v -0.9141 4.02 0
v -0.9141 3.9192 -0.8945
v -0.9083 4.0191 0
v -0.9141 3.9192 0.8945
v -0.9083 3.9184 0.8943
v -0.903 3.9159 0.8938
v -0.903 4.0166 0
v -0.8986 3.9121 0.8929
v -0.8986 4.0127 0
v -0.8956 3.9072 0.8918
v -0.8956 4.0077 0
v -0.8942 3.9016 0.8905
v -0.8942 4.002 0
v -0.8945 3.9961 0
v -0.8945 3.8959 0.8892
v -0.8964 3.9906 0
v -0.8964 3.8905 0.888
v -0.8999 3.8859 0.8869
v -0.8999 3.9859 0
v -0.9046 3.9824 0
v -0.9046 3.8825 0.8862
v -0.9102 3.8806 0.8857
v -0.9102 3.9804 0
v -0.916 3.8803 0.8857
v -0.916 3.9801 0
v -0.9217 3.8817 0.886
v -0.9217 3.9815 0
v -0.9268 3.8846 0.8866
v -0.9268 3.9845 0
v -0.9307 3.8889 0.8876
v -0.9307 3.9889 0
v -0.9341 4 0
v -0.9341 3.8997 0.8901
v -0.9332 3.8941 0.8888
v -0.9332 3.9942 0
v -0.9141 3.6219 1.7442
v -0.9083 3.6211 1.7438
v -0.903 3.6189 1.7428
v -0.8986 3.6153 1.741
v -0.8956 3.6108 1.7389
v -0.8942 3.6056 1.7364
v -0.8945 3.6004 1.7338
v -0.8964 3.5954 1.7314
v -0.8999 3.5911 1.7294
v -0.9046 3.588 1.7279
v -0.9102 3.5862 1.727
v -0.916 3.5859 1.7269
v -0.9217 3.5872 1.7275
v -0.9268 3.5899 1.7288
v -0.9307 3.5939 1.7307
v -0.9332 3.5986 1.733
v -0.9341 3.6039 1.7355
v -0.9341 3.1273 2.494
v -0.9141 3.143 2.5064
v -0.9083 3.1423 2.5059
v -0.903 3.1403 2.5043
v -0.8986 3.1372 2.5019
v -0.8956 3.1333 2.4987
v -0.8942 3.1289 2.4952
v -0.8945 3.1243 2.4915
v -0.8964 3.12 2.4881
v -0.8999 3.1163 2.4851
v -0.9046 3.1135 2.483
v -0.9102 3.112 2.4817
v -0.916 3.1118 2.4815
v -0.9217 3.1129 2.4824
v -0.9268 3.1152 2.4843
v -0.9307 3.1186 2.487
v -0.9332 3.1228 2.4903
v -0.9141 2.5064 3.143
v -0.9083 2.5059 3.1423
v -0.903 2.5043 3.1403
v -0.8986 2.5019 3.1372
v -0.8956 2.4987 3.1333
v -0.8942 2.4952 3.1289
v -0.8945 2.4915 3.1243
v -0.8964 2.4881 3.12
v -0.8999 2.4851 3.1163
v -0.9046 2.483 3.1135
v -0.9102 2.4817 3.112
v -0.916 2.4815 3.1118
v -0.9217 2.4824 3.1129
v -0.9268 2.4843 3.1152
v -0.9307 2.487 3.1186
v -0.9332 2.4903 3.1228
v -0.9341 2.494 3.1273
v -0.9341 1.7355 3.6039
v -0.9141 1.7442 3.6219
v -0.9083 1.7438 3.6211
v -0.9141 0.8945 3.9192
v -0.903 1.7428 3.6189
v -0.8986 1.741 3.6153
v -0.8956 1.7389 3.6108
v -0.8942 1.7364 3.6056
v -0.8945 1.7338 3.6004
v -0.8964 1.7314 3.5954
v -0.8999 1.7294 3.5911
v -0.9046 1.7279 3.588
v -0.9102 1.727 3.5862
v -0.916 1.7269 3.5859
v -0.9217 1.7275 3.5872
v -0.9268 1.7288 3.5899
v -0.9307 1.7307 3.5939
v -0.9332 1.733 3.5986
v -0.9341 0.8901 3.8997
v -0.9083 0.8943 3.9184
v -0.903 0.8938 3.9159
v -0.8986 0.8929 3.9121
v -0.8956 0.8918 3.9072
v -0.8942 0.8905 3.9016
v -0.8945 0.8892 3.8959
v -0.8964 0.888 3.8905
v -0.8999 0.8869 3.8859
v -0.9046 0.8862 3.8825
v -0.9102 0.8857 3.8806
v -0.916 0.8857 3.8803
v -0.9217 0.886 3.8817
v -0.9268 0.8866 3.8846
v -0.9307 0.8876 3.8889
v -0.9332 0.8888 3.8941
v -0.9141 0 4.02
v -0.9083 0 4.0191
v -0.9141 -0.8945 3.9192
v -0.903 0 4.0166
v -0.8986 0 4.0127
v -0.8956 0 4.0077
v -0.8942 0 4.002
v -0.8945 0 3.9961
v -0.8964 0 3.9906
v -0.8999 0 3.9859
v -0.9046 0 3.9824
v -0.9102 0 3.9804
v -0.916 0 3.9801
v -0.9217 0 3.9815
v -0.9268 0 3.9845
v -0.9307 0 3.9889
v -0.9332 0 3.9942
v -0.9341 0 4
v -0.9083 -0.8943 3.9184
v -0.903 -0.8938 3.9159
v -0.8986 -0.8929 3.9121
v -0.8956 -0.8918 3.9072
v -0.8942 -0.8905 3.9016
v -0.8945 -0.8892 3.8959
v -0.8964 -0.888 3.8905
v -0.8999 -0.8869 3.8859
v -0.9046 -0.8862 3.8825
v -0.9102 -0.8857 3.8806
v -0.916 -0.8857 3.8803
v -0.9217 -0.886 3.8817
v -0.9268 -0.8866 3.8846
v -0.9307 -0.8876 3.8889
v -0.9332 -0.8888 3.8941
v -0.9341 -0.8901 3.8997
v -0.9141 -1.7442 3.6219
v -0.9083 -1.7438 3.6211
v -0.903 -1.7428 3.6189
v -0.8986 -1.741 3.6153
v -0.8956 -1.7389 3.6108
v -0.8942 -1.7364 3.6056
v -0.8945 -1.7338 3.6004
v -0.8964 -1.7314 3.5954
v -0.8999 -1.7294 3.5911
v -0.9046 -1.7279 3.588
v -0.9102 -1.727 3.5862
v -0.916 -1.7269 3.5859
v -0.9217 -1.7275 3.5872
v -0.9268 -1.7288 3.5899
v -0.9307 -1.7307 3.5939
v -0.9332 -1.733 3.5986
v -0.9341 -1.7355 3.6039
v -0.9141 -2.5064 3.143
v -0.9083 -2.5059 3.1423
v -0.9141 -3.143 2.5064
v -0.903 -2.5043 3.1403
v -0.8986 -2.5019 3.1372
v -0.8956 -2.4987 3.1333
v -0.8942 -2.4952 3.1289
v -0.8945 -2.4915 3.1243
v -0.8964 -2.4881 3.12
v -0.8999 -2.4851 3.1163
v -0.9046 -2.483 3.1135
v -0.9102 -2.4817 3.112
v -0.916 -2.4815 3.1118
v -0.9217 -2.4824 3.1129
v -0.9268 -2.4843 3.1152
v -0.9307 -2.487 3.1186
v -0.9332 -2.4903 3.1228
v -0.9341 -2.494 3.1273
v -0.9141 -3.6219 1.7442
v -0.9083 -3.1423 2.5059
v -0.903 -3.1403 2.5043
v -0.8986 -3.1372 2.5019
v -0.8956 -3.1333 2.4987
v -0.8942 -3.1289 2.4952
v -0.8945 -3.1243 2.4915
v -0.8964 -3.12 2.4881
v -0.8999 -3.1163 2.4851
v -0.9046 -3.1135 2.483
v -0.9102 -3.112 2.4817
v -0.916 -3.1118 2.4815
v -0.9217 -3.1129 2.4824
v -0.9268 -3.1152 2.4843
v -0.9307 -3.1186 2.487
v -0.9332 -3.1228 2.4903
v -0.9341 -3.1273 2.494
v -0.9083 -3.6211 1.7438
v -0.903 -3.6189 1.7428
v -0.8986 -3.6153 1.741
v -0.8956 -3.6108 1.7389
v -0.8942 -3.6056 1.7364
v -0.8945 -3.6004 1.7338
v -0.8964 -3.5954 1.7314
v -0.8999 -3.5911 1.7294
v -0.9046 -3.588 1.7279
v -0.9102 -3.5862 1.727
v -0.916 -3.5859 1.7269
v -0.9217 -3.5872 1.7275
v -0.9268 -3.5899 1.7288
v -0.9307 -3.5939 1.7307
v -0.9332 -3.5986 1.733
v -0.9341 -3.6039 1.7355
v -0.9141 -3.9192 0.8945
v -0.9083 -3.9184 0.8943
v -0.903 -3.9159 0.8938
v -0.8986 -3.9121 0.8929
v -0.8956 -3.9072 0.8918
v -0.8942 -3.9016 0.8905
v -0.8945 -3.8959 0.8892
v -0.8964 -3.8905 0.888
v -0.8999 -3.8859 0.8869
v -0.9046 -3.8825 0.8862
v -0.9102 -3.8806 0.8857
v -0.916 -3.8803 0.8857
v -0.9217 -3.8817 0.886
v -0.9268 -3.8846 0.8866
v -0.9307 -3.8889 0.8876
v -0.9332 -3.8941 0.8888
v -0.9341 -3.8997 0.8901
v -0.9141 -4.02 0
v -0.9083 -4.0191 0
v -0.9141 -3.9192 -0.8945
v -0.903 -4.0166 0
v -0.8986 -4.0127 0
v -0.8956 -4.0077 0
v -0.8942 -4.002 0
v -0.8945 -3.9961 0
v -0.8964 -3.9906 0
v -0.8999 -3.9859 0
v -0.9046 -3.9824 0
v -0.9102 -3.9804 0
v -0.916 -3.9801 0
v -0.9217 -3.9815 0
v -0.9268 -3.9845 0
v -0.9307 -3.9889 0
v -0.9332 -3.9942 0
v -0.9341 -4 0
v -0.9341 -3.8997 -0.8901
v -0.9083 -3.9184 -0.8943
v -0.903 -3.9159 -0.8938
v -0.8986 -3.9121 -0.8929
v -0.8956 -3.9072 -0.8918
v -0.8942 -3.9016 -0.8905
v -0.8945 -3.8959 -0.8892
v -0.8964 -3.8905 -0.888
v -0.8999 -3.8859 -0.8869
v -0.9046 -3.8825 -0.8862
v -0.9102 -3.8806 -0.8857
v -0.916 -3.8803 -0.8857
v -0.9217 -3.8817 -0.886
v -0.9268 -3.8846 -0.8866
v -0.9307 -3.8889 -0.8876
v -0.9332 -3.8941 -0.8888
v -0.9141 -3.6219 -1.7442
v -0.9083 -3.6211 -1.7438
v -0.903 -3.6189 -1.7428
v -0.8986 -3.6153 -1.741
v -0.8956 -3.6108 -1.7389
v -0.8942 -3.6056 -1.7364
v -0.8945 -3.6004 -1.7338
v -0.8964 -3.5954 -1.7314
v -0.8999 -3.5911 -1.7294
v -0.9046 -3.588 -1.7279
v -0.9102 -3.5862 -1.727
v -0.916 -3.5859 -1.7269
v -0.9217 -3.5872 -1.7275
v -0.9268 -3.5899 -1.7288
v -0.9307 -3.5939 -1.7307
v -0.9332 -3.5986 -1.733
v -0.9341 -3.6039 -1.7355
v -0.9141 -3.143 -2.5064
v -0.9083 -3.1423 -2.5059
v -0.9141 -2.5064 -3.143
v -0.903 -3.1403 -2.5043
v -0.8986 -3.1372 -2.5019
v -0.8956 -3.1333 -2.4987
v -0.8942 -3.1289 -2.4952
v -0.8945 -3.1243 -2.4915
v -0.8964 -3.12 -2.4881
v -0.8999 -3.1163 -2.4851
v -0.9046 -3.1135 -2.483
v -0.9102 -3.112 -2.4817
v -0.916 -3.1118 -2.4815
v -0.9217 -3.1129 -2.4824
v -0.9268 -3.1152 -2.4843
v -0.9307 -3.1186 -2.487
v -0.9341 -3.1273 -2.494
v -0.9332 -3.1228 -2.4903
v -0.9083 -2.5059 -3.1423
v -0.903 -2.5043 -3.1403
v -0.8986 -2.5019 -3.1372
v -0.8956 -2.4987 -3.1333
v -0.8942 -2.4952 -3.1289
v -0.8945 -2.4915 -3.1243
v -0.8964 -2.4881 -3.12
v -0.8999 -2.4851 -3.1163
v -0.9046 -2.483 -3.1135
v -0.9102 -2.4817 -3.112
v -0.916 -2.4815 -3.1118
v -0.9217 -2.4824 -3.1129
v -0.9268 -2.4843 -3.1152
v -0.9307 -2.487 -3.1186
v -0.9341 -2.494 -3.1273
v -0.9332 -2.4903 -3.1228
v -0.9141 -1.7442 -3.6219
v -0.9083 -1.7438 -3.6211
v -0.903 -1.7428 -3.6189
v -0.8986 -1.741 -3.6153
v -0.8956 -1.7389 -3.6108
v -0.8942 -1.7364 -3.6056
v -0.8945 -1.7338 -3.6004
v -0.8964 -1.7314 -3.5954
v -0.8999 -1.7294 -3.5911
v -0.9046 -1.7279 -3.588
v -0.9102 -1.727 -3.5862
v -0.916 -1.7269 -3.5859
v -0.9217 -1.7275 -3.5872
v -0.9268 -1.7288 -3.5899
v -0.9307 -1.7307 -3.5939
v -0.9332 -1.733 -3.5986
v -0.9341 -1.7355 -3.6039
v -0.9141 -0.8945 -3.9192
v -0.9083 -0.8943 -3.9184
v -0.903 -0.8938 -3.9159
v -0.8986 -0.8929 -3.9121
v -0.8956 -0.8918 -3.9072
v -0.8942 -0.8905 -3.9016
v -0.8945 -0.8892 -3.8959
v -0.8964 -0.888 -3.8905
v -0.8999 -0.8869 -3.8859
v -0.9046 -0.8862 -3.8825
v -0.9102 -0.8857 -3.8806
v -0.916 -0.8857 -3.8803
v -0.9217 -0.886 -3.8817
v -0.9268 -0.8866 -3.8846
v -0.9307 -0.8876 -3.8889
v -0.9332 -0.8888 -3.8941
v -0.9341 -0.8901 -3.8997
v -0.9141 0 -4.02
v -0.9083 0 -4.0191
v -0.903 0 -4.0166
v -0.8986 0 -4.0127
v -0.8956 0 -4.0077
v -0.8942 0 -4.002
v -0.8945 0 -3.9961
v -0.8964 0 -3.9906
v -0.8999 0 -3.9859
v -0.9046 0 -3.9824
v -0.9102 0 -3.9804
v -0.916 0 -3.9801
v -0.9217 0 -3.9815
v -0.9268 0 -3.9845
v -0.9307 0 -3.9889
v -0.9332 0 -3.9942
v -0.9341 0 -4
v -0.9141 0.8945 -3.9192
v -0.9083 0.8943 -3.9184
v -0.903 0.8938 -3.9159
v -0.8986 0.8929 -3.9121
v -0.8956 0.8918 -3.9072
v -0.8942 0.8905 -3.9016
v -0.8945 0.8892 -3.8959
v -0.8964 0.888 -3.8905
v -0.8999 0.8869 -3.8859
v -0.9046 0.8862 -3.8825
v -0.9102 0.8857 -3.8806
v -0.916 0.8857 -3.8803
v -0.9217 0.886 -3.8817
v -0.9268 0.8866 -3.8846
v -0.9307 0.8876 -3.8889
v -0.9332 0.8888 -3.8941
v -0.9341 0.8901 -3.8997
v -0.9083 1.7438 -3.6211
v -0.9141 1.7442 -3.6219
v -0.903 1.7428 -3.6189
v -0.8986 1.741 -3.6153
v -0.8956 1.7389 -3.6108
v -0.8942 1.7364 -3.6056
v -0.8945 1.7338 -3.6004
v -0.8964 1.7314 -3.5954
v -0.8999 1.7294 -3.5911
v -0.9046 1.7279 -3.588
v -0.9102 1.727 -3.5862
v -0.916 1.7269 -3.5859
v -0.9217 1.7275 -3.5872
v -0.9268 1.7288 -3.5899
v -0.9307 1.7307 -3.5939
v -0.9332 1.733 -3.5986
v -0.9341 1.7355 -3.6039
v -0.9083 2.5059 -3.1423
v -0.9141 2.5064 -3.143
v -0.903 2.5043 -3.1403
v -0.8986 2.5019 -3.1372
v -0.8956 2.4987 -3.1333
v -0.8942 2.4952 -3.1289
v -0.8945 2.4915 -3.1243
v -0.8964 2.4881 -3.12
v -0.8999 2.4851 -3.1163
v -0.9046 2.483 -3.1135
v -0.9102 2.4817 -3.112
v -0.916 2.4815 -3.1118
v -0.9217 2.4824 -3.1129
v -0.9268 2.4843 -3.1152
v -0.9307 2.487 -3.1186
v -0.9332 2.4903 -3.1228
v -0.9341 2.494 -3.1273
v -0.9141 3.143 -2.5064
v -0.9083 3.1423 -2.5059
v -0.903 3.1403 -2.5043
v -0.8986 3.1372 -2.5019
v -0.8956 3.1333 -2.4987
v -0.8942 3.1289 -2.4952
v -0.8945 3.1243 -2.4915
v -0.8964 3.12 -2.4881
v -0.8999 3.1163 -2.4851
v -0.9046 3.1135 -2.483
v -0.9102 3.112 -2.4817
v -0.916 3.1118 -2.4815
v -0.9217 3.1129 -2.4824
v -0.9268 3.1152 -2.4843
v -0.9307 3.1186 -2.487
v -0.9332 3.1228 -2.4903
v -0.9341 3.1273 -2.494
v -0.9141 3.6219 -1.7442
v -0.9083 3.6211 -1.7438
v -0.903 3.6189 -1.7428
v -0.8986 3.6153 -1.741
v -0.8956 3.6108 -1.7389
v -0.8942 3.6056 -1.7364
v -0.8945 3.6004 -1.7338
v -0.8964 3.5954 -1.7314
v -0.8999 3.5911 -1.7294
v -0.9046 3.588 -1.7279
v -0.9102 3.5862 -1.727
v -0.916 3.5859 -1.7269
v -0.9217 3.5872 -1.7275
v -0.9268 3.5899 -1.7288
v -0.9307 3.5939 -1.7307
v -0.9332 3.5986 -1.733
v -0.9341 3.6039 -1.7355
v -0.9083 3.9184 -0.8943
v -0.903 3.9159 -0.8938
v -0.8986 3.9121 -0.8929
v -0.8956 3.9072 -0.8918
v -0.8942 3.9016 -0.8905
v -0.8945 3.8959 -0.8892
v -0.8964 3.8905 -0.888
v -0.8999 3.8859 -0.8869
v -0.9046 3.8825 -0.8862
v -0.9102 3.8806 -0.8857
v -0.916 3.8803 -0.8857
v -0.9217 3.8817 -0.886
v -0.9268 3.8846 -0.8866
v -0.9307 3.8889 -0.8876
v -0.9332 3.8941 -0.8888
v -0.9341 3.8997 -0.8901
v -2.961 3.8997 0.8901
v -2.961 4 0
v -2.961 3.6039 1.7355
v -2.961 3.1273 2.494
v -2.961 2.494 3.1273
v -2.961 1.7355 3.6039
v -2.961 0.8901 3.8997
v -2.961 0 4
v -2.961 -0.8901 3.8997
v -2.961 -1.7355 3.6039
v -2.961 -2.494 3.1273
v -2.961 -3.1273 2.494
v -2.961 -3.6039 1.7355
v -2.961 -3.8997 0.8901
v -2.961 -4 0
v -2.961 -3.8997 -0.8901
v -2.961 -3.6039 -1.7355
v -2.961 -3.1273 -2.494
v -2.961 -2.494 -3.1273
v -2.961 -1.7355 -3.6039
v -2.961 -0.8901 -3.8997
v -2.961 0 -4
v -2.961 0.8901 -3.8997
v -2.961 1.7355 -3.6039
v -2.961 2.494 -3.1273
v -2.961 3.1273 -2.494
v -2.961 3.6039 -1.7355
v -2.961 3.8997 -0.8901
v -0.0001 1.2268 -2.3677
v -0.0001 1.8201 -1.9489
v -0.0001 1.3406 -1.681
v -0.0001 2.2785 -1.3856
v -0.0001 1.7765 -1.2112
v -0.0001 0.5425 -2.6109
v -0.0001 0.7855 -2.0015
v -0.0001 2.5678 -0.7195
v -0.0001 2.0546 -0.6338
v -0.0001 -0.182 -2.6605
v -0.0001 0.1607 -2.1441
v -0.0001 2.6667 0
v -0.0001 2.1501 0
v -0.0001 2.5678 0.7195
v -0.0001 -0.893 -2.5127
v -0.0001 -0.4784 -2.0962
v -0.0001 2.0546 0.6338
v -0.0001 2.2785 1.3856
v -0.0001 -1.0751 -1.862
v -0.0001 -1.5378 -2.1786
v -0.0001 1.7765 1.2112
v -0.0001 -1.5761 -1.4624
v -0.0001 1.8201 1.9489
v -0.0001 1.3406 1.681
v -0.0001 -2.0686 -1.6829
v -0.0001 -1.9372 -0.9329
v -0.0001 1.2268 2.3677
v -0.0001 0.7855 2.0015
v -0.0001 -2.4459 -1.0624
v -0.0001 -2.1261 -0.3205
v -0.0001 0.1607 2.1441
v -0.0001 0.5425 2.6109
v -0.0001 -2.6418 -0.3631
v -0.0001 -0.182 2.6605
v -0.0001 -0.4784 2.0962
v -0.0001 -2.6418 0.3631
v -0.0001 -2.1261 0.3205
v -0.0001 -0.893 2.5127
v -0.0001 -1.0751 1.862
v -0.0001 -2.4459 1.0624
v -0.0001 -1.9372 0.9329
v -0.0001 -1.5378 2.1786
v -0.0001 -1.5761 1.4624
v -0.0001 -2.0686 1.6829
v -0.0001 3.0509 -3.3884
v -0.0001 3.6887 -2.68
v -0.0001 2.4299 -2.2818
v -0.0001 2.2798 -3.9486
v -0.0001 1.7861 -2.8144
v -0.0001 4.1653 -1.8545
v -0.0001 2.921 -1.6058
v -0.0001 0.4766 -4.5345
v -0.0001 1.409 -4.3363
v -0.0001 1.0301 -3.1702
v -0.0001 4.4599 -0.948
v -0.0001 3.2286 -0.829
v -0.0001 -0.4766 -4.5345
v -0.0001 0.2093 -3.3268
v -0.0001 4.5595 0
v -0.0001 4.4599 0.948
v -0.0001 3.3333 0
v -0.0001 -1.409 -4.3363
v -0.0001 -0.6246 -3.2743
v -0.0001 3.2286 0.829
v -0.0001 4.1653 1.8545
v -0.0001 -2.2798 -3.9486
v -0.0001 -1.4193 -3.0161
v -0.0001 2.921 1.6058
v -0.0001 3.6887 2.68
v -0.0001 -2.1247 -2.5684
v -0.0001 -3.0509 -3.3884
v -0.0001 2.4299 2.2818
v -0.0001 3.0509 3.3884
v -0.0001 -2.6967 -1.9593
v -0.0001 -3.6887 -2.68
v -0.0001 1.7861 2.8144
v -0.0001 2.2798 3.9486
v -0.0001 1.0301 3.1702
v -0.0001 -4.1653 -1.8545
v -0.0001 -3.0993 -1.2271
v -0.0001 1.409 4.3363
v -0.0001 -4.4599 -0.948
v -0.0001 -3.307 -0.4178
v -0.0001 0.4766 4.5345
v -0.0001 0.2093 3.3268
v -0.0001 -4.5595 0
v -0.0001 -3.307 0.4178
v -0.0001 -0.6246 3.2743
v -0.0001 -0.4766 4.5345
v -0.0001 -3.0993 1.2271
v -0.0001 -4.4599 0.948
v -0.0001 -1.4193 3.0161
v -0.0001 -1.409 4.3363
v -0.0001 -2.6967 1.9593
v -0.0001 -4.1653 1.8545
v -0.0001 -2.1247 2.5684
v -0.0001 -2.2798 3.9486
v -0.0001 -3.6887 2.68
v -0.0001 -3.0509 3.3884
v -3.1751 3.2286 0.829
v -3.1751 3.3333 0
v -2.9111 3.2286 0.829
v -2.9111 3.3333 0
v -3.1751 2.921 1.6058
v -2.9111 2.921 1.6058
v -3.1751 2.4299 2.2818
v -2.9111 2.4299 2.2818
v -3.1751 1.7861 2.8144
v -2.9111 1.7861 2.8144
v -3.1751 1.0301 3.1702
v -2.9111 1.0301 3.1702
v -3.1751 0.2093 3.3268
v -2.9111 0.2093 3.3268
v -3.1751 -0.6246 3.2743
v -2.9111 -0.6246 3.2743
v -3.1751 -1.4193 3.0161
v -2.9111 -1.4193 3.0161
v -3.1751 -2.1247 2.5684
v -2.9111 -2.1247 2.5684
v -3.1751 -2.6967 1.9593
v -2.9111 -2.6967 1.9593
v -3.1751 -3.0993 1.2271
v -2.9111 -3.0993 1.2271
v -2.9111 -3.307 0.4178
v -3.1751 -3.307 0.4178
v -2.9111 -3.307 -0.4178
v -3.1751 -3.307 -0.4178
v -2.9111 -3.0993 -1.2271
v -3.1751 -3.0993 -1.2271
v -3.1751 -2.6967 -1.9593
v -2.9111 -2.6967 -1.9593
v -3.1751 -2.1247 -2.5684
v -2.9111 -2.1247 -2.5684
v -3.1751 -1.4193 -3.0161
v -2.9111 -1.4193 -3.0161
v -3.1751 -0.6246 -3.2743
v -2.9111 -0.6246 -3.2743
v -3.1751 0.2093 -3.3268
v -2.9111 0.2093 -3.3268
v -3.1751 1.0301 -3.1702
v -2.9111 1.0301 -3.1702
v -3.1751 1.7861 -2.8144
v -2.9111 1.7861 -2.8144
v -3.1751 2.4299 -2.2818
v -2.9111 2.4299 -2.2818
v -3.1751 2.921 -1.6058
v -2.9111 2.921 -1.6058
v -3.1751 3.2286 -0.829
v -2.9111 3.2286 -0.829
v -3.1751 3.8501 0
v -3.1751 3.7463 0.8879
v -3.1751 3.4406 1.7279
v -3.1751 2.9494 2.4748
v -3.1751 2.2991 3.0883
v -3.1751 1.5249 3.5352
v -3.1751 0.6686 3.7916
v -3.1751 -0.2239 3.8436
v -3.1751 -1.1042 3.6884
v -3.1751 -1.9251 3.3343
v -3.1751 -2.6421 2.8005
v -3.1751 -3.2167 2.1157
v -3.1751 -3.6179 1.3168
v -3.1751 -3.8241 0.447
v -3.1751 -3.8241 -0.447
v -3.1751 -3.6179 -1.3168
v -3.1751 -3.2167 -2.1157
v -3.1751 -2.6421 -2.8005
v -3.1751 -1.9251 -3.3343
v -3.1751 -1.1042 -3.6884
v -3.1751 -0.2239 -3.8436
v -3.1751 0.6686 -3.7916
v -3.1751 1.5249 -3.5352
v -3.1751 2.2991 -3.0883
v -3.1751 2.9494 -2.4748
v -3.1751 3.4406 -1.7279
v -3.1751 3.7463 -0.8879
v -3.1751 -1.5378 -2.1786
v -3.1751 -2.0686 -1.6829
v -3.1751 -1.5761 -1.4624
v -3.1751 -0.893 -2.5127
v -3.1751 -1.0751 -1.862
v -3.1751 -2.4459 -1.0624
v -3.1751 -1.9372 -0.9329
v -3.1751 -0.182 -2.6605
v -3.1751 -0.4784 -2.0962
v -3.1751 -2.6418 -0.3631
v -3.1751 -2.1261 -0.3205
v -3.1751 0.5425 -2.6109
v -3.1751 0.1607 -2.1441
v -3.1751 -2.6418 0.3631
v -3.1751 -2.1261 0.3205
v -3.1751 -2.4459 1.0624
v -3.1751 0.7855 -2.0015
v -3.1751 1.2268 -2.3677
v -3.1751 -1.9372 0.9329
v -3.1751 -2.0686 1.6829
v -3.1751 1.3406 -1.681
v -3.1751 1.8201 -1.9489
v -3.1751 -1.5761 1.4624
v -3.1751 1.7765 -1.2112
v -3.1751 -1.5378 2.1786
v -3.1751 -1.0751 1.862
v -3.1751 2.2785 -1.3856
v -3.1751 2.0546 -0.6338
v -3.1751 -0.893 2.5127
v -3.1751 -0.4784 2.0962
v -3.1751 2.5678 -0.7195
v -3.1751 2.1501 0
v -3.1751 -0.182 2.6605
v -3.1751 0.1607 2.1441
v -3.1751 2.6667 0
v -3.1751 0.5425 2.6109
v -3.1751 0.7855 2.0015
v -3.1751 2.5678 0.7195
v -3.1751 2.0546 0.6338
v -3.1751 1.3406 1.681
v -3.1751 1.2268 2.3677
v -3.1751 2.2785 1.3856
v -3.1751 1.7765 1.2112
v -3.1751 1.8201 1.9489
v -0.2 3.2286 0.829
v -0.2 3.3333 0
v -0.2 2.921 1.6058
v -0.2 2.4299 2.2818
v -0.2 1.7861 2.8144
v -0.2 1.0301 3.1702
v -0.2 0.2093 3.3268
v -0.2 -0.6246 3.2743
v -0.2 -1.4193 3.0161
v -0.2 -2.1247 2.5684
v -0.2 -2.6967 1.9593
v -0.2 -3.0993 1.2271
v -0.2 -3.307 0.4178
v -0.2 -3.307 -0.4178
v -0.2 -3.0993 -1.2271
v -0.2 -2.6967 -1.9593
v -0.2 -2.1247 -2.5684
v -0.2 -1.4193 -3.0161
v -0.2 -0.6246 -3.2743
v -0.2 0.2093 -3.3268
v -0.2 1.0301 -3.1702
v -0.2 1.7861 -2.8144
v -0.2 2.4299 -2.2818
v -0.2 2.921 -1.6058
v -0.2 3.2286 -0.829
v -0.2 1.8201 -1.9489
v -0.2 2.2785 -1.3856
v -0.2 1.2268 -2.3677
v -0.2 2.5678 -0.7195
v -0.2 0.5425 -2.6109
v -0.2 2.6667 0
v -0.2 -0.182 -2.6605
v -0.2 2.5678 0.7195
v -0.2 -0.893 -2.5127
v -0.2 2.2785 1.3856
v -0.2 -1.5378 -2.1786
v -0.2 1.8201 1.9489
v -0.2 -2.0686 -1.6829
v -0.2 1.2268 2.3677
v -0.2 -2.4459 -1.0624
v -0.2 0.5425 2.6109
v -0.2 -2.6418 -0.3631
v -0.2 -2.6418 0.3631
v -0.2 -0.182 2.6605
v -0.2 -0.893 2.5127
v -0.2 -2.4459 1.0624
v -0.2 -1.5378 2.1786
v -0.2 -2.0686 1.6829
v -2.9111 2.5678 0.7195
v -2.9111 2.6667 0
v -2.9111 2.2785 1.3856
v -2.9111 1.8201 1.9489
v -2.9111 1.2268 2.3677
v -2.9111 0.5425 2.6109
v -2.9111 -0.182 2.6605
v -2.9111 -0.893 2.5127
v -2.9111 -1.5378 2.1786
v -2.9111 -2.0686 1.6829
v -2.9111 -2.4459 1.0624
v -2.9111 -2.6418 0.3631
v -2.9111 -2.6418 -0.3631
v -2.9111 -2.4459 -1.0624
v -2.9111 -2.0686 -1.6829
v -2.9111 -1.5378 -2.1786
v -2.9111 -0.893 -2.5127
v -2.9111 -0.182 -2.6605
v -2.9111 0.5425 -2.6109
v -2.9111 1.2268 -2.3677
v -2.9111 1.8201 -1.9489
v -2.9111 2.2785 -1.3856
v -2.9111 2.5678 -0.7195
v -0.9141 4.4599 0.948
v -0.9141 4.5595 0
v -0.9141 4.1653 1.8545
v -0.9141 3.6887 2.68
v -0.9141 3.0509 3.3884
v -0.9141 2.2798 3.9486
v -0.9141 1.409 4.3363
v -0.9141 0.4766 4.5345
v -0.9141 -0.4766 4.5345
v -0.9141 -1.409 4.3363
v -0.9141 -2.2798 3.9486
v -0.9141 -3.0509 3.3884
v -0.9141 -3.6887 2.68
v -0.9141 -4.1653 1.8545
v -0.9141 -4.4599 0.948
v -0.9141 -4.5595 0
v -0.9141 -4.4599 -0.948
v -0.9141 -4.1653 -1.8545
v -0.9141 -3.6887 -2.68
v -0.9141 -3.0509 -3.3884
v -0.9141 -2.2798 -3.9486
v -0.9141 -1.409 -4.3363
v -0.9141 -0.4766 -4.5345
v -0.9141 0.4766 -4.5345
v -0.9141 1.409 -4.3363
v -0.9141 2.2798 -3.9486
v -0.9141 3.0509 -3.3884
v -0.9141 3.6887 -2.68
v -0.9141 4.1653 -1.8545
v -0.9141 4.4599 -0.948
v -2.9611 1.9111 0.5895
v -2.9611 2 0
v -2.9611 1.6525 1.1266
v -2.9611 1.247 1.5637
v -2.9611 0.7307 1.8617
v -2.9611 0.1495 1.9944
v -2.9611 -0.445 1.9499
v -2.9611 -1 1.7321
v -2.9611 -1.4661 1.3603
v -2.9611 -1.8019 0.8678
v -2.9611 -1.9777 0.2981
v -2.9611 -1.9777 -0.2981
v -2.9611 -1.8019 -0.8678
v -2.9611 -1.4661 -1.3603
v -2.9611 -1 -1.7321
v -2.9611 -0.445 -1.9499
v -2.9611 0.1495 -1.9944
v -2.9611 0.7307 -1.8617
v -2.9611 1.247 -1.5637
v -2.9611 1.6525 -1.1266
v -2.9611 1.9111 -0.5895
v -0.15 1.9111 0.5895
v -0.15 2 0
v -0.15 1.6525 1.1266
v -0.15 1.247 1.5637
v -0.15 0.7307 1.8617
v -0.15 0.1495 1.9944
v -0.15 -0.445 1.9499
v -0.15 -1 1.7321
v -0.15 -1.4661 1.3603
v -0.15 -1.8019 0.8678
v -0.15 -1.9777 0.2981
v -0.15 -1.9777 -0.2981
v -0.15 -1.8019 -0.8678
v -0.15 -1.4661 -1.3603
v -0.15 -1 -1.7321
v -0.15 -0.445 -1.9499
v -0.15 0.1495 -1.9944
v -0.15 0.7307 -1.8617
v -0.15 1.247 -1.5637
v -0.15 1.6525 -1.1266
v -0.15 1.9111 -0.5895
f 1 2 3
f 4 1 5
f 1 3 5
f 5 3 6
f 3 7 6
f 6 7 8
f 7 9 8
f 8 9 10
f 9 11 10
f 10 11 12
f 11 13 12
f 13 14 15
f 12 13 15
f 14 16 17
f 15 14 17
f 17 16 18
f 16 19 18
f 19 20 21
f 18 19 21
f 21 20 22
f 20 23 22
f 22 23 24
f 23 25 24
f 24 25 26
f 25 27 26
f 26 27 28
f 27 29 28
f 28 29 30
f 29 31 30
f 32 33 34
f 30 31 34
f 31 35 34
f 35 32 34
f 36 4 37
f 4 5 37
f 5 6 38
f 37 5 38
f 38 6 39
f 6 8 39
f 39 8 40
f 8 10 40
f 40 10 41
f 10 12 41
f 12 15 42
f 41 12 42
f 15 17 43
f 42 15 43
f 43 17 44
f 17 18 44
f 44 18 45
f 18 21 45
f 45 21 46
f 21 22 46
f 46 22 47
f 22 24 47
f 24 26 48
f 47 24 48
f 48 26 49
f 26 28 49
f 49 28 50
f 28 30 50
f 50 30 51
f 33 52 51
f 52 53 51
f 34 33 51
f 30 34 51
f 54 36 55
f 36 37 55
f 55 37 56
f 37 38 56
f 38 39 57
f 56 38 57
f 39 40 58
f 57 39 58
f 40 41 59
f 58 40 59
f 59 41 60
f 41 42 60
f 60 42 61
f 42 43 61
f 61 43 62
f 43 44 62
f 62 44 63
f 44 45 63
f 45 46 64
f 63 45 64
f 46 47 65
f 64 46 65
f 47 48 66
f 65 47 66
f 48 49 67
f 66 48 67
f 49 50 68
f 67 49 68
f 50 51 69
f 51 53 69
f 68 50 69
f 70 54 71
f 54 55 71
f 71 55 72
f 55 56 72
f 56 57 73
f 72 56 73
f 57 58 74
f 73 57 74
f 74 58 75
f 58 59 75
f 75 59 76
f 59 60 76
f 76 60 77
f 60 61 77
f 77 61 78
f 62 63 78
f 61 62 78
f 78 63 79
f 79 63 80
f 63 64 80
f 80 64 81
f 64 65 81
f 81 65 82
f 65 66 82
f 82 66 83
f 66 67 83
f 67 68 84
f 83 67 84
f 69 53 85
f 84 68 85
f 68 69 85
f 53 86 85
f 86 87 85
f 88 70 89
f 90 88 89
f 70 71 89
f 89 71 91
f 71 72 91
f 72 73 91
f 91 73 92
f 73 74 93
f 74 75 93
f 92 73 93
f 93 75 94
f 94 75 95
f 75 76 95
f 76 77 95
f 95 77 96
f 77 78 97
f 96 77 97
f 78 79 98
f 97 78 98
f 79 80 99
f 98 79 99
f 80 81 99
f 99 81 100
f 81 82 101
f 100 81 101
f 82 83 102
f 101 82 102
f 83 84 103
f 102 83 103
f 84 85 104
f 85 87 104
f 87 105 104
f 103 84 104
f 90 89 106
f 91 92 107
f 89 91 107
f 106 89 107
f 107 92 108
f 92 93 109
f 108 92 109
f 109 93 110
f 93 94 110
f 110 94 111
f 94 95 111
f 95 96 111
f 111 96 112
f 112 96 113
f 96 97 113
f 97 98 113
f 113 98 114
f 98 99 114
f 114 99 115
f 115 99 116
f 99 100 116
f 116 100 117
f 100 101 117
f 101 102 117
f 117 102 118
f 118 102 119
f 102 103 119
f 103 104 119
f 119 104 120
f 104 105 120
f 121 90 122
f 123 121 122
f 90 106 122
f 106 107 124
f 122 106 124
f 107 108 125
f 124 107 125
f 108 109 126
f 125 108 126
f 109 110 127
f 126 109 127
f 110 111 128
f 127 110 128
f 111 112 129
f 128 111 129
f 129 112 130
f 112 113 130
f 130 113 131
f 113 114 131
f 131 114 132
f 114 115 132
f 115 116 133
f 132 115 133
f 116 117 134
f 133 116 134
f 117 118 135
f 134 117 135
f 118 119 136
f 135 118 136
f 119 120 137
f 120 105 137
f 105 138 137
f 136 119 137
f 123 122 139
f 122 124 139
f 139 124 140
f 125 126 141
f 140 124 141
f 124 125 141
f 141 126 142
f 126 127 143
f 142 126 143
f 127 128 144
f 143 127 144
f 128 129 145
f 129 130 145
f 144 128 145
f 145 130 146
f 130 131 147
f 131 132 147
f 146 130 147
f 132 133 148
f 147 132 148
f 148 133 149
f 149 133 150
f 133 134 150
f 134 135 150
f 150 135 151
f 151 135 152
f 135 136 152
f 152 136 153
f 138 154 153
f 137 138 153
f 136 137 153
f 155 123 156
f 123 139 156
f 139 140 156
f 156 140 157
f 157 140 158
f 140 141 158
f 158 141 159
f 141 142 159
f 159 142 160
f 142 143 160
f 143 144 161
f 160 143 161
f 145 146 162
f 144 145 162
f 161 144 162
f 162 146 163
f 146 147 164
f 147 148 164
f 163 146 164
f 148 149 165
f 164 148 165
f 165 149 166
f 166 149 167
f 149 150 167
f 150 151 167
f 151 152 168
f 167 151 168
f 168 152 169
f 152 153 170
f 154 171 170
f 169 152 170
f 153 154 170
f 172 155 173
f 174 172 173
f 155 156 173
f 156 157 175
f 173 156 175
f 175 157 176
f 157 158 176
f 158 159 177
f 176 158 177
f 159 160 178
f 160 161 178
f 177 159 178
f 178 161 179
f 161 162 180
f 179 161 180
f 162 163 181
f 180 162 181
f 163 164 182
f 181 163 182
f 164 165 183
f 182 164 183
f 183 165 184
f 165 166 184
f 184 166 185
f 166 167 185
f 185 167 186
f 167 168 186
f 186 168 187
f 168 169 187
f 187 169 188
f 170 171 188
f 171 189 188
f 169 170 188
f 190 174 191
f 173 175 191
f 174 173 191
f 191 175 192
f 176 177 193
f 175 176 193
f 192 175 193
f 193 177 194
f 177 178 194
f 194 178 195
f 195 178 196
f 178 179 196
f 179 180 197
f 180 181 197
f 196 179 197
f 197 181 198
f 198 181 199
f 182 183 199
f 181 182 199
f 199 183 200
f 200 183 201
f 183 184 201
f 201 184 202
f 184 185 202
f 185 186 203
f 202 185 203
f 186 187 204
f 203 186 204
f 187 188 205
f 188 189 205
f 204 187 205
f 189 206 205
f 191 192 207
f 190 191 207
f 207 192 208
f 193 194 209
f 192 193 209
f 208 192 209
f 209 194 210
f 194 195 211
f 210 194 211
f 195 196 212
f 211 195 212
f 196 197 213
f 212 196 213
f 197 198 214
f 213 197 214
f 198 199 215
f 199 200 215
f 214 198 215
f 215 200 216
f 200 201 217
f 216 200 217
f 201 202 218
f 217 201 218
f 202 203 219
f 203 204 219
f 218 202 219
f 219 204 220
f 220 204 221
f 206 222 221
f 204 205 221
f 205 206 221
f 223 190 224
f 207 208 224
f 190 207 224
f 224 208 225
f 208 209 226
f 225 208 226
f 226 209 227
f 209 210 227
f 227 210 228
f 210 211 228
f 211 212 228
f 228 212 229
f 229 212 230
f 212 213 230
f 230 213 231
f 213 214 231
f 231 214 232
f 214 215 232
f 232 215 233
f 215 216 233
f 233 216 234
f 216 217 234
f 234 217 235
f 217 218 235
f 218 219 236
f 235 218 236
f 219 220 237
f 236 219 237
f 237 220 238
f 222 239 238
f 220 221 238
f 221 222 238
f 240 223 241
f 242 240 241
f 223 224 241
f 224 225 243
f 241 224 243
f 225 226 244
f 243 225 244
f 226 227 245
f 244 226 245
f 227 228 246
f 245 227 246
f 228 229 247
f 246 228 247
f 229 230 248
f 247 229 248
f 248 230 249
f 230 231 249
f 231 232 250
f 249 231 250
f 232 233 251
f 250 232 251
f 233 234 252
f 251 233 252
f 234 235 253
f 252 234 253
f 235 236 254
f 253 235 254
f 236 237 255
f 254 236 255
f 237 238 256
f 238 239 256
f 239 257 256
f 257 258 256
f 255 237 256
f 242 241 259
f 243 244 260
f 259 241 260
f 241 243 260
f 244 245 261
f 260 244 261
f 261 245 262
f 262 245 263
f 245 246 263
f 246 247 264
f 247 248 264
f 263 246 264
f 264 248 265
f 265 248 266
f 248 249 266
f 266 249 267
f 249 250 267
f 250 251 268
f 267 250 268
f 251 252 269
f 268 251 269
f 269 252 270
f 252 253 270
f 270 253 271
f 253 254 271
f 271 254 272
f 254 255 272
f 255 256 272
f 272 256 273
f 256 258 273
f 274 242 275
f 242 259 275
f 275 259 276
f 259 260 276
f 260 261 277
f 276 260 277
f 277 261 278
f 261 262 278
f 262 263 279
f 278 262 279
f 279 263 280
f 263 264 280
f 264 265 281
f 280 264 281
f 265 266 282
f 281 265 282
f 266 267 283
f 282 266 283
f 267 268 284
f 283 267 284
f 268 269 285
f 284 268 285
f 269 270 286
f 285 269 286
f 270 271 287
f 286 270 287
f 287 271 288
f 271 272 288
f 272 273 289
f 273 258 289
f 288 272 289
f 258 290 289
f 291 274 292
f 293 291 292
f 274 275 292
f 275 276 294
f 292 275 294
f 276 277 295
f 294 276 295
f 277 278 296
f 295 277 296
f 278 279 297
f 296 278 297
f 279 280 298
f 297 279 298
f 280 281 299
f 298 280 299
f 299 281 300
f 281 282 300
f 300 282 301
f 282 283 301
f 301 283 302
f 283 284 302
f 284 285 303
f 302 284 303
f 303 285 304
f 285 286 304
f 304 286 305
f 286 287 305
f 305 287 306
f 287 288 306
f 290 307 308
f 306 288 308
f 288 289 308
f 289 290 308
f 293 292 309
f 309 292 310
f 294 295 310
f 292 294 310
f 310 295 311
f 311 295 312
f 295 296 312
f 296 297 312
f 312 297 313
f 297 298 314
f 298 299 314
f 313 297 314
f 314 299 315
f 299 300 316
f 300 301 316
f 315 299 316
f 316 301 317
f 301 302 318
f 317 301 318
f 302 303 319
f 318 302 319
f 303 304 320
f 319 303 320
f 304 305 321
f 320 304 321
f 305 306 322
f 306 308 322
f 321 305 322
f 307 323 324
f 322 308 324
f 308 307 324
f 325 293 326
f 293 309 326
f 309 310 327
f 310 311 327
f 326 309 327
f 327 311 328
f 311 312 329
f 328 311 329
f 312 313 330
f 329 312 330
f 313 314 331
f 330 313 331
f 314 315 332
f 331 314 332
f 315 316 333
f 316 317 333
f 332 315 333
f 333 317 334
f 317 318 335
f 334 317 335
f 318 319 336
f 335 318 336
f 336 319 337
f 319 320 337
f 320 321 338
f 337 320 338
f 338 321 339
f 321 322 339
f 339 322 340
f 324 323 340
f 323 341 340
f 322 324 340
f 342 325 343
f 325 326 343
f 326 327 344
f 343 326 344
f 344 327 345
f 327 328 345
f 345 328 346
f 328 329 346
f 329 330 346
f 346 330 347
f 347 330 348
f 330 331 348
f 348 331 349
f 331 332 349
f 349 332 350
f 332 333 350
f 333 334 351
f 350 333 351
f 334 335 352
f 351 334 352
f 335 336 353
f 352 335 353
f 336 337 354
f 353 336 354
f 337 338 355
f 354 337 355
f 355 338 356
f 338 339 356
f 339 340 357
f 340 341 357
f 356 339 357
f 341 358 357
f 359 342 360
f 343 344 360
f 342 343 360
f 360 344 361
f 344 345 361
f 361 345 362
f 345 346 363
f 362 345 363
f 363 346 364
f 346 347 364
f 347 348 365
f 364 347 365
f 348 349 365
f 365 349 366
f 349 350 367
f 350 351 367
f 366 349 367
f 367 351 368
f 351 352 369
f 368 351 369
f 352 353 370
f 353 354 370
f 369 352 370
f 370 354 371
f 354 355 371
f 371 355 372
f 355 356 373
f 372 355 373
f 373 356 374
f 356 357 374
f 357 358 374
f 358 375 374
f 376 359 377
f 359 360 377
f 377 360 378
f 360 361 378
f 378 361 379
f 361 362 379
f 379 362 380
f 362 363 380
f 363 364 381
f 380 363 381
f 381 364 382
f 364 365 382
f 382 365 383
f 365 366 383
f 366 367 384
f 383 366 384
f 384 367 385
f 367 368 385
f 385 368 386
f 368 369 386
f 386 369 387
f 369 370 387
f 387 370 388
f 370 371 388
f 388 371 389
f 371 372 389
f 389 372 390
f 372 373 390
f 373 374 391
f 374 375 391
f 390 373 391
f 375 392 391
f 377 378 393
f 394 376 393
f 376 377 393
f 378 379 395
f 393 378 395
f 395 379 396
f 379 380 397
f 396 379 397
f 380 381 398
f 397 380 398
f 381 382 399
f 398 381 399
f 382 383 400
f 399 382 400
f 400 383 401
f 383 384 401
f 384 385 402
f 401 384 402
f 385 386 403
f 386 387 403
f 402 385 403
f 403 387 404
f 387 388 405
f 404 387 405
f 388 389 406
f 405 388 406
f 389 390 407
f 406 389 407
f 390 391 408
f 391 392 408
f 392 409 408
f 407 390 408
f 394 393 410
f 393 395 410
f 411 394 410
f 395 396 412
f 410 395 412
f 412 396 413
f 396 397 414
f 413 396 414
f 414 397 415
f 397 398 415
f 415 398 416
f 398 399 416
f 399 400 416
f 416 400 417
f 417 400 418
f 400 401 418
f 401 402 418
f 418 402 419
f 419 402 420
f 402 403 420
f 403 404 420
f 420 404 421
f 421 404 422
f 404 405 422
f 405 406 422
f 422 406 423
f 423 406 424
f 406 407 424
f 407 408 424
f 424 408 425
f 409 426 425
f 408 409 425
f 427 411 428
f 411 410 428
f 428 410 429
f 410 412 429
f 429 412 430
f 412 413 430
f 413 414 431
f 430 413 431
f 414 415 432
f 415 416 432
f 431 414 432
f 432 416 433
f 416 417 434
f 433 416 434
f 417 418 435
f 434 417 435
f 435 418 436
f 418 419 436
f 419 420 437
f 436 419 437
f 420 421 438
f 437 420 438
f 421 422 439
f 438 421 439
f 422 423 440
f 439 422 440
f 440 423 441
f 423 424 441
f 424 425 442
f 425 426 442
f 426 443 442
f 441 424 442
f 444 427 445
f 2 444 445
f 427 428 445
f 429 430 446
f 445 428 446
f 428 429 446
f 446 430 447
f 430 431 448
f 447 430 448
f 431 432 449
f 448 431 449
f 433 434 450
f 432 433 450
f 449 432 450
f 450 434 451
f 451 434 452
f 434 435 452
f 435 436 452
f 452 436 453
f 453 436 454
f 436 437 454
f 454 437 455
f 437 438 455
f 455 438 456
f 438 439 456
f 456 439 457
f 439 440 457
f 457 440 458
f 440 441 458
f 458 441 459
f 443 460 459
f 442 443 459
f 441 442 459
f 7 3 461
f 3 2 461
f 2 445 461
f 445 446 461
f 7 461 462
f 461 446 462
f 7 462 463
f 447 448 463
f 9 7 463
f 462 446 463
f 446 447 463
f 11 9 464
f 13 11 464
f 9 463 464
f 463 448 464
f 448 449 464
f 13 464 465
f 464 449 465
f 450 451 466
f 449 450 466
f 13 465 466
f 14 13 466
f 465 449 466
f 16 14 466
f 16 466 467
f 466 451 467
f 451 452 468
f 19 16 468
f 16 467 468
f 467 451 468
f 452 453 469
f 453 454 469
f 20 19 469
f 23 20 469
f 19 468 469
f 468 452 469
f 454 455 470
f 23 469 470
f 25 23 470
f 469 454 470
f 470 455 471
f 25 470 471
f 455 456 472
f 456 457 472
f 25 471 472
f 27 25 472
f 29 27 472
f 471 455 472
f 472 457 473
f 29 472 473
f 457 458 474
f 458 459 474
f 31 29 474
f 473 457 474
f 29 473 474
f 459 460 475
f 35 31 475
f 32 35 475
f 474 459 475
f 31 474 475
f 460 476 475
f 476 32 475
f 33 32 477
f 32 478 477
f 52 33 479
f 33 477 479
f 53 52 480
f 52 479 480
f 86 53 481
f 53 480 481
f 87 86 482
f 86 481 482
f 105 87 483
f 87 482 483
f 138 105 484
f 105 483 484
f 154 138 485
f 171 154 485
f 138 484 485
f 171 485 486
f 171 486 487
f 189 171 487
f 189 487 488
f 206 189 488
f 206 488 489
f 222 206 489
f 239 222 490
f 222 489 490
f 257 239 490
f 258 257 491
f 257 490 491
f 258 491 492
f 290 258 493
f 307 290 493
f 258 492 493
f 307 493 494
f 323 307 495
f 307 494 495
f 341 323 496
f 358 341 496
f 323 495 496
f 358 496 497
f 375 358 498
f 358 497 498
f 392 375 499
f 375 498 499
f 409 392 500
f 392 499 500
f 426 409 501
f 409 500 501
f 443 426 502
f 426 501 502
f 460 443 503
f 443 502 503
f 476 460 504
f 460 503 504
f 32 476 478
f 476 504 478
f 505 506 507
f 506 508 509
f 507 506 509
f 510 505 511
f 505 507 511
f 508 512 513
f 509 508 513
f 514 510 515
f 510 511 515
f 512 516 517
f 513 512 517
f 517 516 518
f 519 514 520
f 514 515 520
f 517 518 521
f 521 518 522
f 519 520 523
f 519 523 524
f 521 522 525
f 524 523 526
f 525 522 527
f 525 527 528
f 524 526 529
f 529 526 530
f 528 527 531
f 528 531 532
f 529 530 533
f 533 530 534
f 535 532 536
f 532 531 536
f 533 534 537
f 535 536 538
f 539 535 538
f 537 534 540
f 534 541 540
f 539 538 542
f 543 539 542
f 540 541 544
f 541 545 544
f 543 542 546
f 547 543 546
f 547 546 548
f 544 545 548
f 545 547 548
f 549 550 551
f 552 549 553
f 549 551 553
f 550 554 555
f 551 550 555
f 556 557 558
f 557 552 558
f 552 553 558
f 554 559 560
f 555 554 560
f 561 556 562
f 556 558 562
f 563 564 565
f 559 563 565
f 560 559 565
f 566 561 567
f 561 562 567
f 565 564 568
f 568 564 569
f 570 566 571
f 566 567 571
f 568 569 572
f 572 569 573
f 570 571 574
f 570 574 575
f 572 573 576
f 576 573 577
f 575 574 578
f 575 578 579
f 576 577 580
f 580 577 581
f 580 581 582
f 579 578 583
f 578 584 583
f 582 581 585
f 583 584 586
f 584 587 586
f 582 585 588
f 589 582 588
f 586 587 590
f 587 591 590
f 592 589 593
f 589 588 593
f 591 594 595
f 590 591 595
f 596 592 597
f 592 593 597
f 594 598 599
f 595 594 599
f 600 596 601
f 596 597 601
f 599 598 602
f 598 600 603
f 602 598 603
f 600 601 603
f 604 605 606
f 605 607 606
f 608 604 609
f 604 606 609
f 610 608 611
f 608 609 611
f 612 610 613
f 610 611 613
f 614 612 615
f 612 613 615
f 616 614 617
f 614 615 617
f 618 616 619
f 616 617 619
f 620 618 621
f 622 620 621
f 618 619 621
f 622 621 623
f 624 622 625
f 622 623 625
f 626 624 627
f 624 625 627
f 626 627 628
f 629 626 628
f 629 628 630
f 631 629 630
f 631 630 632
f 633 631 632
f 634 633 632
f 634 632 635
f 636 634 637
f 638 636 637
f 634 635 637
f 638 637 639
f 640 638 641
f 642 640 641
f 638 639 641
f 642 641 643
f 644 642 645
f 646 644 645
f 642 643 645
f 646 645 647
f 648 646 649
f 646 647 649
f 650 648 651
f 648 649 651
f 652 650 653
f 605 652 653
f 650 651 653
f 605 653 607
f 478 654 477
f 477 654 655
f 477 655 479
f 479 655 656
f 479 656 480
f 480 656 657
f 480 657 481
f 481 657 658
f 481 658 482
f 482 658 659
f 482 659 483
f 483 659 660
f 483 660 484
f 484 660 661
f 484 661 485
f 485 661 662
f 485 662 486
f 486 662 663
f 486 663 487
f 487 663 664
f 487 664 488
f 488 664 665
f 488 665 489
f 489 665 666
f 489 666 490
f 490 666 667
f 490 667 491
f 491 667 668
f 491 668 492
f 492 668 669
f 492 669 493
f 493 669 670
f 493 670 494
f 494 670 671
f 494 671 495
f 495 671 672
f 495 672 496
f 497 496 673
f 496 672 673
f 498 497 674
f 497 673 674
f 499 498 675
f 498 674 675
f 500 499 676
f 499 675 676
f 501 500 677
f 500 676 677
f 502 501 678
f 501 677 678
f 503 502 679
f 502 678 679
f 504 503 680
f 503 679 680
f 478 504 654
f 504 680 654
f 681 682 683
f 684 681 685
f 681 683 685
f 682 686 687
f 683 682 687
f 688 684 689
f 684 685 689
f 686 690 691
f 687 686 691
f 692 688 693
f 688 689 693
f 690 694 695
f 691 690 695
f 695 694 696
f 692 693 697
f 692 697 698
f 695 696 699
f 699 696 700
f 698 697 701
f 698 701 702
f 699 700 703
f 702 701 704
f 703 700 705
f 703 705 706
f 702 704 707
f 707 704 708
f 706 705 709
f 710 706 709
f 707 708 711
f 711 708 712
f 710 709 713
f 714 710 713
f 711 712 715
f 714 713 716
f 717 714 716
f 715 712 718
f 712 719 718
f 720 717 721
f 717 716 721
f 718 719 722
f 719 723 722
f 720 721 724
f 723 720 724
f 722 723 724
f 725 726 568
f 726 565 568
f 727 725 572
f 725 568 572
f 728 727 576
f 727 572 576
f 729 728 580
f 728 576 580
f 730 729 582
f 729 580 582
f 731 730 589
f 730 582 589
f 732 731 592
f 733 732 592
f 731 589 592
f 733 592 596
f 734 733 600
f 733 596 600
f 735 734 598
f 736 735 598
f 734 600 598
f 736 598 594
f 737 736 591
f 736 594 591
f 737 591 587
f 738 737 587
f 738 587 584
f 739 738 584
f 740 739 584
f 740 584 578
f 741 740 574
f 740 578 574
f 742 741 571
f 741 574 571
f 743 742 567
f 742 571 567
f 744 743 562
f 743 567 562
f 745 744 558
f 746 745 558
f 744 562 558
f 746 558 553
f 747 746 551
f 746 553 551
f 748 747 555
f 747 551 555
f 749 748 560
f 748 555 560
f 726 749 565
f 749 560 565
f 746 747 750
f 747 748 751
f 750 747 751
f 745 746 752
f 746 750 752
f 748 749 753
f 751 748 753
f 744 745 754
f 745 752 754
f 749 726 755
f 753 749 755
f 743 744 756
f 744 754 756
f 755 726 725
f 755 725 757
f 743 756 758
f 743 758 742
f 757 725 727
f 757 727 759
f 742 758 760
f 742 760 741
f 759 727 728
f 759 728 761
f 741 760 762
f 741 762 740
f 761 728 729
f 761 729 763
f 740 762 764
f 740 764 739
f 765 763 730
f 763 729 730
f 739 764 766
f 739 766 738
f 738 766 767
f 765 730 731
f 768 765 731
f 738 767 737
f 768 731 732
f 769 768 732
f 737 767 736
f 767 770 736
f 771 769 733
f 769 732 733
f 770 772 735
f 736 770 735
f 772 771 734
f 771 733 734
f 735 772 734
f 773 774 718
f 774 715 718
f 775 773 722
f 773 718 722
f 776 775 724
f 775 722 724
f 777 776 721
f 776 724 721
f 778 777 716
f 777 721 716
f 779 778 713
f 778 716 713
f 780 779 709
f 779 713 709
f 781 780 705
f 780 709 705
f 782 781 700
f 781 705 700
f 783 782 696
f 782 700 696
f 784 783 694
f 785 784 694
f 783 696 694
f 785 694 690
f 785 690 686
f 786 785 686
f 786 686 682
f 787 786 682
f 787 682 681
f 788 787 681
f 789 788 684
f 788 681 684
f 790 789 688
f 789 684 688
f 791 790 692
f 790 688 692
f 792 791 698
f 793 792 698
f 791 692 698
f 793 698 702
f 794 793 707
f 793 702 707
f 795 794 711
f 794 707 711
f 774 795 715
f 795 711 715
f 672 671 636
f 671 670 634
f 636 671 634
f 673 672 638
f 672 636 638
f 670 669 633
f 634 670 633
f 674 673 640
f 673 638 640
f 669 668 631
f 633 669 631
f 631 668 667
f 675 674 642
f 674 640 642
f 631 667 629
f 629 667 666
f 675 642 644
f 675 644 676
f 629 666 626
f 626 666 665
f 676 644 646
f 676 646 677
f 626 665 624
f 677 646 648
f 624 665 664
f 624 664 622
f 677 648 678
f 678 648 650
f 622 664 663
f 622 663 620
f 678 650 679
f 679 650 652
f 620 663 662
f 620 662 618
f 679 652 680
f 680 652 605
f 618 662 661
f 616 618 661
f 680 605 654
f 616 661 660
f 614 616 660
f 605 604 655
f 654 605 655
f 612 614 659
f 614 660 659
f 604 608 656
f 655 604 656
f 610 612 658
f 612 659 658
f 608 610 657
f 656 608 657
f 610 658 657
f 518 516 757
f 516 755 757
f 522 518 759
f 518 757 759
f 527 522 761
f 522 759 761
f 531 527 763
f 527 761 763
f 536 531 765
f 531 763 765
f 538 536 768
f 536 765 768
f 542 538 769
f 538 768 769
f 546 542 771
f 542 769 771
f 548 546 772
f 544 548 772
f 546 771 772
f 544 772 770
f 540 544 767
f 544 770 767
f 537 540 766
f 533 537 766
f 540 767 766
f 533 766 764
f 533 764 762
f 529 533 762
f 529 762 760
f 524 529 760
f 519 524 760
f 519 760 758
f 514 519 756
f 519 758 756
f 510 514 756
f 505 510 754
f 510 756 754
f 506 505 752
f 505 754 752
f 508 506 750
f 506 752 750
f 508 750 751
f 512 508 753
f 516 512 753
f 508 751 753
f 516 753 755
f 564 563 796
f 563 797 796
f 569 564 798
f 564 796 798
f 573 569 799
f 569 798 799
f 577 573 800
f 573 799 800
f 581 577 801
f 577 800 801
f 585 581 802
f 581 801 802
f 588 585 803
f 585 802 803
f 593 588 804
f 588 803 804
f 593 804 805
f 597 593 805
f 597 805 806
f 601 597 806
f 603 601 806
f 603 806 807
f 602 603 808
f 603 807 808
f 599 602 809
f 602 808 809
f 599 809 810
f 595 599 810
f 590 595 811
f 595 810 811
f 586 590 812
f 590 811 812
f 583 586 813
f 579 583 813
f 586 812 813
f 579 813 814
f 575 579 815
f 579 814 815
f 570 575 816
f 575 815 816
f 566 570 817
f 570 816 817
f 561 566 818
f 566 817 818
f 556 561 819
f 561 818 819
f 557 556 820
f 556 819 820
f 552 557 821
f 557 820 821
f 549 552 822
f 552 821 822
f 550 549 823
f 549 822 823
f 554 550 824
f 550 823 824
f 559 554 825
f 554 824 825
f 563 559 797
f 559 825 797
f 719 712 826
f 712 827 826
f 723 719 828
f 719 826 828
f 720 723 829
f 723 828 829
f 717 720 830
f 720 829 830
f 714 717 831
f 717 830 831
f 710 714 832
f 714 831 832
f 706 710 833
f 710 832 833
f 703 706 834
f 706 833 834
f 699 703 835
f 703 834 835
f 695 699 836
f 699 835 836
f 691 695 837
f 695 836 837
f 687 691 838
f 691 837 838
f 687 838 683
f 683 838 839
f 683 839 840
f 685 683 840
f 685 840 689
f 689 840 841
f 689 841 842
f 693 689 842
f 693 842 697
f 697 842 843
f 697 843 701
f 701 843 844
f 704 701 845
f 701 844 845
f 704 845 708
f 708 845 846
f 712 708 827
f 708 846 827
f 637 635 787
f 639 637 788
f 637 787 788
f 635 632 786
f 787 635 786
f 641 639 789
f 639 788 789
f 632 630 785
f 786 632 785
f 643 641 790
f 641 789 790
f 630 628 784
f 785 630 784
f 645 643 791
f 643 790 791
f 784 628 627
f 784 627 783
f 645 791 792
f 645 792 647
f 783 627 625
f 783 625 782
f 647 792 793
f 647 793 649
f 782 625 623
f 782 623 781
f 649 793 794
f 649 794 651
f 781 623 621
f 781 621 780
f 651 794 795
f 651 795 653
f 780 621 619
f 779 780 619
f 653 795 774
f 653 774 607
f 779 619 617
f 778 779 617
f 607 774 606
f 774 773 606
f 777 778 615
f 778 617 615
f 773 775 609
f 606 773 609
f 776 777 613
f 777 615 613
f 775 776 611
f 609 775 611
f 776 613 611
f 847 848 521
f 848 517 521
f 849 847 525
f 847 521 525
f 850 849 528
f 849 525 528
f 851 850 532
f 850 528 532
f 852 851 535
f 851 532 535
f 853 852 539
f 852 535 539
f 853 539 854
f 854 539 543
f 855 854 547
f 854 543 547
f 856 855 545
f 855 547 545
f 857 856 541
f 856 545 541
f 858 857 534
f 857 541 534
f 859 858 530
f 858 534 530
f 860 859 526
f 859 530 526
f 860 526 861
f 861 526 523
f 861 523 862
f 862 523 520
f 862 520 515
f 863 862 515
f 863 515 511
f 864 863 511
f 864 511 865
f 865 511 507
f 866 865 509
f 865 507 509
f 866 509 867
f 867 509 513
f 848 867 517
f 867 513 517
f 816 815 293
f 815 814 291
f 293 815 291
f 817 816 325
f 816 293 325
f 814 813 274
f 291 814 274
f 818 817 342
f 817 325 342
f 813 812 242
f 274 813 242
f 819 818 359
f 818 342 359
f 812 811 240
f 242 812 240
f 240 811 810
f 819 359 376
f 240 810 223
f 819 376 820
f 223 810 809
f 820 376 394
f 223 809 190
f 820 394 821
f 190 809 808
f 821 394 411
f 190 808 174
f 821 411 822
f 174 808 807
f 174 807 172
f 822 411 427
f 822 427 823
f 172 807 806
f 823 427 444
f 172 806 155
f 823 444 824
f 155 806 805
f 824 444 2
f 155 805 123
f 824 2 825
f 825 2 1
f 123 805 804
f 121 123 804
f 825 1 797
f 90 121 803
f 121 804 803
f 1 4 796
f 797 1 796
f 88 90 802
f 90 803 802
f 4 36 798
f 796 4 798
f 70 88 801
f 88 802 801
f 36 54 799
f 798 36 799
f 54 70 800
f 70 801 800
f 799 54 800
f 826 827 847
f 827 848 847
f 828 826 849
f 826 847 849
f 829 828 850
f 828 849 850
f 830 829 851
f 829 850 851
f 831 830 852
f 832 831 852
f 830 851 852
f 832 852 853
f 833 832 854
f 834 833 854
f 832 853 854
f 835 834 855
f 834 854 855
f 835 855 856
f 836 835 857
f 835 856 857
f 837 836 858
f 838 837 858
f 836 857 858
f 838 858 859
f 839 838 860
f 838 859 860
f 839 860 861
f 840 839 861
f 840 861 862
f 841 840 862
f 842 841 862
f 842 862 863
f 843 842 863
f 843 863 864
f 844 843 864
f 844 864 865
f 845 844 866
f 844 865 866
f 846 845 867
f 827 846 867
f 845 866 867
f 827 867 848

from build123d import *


with BuildPart() as part:
    # Schizzo1 → Rivoluzione1 (revolve)
    with BuildSketch(Plane.XY):
        with BuildLine():
            Line((-2.911073127, 3.333333333), (-2.911073127, 2.666666667))
            Line((-2.911073127, 2.666666667), (-3.175073127, 2.666666667))
            Line((-3.175073127, 2.666666667), (-3.175073127, 2.150104382))
            Line((-3.175073127, 2.150104382), (-2.961146331, 2))
            Line((-2.961146331, 2), (-0.149968672, 2))
            Line((-0.149968672, 2), (-7.3127e-05, 2.150104382))
            Line((-7.3127e-05, 2.150104382), (-7.3127e-05, 2.666666667))
            Line((-7.3127e-05, 2.666666667), (-0.2, 2.666666667))
            Line((-0.2, 2.666666667), (-0.2, 3.333333333))
            Line((-0.2, 3.333333333), (-7.3127e-05, 3.333333333))
            Line((-7.3127e-05, 3.333333333), (-7.3127e-05, 4.5595))
            Line((-7.3127e-05, 4.5595), (-0.914073127, 4.5595))
            Line((-0.914073127, 4.5595), (-0.914073127, 4.02))
            ThreePointArc((-0.914073127, 4.02), (-0.899930992, 3.985857864), (-0.934073127, 4))
            Line((-0.934073127, 4), (-2.961, 4))
            Line((-2.961, 4), (-3.175073127, 3.850104382))
            Line((-3.175073127, 3.850104382), (-3.175073127, 3.333333333))
            Line((-3.175073127, 3.333333333), (-2.911073127, 3.333333333))
        make_face()
    revolve(axis=Axis((-4, 0, 0), (1, 0, 0)))


solid = part.part
